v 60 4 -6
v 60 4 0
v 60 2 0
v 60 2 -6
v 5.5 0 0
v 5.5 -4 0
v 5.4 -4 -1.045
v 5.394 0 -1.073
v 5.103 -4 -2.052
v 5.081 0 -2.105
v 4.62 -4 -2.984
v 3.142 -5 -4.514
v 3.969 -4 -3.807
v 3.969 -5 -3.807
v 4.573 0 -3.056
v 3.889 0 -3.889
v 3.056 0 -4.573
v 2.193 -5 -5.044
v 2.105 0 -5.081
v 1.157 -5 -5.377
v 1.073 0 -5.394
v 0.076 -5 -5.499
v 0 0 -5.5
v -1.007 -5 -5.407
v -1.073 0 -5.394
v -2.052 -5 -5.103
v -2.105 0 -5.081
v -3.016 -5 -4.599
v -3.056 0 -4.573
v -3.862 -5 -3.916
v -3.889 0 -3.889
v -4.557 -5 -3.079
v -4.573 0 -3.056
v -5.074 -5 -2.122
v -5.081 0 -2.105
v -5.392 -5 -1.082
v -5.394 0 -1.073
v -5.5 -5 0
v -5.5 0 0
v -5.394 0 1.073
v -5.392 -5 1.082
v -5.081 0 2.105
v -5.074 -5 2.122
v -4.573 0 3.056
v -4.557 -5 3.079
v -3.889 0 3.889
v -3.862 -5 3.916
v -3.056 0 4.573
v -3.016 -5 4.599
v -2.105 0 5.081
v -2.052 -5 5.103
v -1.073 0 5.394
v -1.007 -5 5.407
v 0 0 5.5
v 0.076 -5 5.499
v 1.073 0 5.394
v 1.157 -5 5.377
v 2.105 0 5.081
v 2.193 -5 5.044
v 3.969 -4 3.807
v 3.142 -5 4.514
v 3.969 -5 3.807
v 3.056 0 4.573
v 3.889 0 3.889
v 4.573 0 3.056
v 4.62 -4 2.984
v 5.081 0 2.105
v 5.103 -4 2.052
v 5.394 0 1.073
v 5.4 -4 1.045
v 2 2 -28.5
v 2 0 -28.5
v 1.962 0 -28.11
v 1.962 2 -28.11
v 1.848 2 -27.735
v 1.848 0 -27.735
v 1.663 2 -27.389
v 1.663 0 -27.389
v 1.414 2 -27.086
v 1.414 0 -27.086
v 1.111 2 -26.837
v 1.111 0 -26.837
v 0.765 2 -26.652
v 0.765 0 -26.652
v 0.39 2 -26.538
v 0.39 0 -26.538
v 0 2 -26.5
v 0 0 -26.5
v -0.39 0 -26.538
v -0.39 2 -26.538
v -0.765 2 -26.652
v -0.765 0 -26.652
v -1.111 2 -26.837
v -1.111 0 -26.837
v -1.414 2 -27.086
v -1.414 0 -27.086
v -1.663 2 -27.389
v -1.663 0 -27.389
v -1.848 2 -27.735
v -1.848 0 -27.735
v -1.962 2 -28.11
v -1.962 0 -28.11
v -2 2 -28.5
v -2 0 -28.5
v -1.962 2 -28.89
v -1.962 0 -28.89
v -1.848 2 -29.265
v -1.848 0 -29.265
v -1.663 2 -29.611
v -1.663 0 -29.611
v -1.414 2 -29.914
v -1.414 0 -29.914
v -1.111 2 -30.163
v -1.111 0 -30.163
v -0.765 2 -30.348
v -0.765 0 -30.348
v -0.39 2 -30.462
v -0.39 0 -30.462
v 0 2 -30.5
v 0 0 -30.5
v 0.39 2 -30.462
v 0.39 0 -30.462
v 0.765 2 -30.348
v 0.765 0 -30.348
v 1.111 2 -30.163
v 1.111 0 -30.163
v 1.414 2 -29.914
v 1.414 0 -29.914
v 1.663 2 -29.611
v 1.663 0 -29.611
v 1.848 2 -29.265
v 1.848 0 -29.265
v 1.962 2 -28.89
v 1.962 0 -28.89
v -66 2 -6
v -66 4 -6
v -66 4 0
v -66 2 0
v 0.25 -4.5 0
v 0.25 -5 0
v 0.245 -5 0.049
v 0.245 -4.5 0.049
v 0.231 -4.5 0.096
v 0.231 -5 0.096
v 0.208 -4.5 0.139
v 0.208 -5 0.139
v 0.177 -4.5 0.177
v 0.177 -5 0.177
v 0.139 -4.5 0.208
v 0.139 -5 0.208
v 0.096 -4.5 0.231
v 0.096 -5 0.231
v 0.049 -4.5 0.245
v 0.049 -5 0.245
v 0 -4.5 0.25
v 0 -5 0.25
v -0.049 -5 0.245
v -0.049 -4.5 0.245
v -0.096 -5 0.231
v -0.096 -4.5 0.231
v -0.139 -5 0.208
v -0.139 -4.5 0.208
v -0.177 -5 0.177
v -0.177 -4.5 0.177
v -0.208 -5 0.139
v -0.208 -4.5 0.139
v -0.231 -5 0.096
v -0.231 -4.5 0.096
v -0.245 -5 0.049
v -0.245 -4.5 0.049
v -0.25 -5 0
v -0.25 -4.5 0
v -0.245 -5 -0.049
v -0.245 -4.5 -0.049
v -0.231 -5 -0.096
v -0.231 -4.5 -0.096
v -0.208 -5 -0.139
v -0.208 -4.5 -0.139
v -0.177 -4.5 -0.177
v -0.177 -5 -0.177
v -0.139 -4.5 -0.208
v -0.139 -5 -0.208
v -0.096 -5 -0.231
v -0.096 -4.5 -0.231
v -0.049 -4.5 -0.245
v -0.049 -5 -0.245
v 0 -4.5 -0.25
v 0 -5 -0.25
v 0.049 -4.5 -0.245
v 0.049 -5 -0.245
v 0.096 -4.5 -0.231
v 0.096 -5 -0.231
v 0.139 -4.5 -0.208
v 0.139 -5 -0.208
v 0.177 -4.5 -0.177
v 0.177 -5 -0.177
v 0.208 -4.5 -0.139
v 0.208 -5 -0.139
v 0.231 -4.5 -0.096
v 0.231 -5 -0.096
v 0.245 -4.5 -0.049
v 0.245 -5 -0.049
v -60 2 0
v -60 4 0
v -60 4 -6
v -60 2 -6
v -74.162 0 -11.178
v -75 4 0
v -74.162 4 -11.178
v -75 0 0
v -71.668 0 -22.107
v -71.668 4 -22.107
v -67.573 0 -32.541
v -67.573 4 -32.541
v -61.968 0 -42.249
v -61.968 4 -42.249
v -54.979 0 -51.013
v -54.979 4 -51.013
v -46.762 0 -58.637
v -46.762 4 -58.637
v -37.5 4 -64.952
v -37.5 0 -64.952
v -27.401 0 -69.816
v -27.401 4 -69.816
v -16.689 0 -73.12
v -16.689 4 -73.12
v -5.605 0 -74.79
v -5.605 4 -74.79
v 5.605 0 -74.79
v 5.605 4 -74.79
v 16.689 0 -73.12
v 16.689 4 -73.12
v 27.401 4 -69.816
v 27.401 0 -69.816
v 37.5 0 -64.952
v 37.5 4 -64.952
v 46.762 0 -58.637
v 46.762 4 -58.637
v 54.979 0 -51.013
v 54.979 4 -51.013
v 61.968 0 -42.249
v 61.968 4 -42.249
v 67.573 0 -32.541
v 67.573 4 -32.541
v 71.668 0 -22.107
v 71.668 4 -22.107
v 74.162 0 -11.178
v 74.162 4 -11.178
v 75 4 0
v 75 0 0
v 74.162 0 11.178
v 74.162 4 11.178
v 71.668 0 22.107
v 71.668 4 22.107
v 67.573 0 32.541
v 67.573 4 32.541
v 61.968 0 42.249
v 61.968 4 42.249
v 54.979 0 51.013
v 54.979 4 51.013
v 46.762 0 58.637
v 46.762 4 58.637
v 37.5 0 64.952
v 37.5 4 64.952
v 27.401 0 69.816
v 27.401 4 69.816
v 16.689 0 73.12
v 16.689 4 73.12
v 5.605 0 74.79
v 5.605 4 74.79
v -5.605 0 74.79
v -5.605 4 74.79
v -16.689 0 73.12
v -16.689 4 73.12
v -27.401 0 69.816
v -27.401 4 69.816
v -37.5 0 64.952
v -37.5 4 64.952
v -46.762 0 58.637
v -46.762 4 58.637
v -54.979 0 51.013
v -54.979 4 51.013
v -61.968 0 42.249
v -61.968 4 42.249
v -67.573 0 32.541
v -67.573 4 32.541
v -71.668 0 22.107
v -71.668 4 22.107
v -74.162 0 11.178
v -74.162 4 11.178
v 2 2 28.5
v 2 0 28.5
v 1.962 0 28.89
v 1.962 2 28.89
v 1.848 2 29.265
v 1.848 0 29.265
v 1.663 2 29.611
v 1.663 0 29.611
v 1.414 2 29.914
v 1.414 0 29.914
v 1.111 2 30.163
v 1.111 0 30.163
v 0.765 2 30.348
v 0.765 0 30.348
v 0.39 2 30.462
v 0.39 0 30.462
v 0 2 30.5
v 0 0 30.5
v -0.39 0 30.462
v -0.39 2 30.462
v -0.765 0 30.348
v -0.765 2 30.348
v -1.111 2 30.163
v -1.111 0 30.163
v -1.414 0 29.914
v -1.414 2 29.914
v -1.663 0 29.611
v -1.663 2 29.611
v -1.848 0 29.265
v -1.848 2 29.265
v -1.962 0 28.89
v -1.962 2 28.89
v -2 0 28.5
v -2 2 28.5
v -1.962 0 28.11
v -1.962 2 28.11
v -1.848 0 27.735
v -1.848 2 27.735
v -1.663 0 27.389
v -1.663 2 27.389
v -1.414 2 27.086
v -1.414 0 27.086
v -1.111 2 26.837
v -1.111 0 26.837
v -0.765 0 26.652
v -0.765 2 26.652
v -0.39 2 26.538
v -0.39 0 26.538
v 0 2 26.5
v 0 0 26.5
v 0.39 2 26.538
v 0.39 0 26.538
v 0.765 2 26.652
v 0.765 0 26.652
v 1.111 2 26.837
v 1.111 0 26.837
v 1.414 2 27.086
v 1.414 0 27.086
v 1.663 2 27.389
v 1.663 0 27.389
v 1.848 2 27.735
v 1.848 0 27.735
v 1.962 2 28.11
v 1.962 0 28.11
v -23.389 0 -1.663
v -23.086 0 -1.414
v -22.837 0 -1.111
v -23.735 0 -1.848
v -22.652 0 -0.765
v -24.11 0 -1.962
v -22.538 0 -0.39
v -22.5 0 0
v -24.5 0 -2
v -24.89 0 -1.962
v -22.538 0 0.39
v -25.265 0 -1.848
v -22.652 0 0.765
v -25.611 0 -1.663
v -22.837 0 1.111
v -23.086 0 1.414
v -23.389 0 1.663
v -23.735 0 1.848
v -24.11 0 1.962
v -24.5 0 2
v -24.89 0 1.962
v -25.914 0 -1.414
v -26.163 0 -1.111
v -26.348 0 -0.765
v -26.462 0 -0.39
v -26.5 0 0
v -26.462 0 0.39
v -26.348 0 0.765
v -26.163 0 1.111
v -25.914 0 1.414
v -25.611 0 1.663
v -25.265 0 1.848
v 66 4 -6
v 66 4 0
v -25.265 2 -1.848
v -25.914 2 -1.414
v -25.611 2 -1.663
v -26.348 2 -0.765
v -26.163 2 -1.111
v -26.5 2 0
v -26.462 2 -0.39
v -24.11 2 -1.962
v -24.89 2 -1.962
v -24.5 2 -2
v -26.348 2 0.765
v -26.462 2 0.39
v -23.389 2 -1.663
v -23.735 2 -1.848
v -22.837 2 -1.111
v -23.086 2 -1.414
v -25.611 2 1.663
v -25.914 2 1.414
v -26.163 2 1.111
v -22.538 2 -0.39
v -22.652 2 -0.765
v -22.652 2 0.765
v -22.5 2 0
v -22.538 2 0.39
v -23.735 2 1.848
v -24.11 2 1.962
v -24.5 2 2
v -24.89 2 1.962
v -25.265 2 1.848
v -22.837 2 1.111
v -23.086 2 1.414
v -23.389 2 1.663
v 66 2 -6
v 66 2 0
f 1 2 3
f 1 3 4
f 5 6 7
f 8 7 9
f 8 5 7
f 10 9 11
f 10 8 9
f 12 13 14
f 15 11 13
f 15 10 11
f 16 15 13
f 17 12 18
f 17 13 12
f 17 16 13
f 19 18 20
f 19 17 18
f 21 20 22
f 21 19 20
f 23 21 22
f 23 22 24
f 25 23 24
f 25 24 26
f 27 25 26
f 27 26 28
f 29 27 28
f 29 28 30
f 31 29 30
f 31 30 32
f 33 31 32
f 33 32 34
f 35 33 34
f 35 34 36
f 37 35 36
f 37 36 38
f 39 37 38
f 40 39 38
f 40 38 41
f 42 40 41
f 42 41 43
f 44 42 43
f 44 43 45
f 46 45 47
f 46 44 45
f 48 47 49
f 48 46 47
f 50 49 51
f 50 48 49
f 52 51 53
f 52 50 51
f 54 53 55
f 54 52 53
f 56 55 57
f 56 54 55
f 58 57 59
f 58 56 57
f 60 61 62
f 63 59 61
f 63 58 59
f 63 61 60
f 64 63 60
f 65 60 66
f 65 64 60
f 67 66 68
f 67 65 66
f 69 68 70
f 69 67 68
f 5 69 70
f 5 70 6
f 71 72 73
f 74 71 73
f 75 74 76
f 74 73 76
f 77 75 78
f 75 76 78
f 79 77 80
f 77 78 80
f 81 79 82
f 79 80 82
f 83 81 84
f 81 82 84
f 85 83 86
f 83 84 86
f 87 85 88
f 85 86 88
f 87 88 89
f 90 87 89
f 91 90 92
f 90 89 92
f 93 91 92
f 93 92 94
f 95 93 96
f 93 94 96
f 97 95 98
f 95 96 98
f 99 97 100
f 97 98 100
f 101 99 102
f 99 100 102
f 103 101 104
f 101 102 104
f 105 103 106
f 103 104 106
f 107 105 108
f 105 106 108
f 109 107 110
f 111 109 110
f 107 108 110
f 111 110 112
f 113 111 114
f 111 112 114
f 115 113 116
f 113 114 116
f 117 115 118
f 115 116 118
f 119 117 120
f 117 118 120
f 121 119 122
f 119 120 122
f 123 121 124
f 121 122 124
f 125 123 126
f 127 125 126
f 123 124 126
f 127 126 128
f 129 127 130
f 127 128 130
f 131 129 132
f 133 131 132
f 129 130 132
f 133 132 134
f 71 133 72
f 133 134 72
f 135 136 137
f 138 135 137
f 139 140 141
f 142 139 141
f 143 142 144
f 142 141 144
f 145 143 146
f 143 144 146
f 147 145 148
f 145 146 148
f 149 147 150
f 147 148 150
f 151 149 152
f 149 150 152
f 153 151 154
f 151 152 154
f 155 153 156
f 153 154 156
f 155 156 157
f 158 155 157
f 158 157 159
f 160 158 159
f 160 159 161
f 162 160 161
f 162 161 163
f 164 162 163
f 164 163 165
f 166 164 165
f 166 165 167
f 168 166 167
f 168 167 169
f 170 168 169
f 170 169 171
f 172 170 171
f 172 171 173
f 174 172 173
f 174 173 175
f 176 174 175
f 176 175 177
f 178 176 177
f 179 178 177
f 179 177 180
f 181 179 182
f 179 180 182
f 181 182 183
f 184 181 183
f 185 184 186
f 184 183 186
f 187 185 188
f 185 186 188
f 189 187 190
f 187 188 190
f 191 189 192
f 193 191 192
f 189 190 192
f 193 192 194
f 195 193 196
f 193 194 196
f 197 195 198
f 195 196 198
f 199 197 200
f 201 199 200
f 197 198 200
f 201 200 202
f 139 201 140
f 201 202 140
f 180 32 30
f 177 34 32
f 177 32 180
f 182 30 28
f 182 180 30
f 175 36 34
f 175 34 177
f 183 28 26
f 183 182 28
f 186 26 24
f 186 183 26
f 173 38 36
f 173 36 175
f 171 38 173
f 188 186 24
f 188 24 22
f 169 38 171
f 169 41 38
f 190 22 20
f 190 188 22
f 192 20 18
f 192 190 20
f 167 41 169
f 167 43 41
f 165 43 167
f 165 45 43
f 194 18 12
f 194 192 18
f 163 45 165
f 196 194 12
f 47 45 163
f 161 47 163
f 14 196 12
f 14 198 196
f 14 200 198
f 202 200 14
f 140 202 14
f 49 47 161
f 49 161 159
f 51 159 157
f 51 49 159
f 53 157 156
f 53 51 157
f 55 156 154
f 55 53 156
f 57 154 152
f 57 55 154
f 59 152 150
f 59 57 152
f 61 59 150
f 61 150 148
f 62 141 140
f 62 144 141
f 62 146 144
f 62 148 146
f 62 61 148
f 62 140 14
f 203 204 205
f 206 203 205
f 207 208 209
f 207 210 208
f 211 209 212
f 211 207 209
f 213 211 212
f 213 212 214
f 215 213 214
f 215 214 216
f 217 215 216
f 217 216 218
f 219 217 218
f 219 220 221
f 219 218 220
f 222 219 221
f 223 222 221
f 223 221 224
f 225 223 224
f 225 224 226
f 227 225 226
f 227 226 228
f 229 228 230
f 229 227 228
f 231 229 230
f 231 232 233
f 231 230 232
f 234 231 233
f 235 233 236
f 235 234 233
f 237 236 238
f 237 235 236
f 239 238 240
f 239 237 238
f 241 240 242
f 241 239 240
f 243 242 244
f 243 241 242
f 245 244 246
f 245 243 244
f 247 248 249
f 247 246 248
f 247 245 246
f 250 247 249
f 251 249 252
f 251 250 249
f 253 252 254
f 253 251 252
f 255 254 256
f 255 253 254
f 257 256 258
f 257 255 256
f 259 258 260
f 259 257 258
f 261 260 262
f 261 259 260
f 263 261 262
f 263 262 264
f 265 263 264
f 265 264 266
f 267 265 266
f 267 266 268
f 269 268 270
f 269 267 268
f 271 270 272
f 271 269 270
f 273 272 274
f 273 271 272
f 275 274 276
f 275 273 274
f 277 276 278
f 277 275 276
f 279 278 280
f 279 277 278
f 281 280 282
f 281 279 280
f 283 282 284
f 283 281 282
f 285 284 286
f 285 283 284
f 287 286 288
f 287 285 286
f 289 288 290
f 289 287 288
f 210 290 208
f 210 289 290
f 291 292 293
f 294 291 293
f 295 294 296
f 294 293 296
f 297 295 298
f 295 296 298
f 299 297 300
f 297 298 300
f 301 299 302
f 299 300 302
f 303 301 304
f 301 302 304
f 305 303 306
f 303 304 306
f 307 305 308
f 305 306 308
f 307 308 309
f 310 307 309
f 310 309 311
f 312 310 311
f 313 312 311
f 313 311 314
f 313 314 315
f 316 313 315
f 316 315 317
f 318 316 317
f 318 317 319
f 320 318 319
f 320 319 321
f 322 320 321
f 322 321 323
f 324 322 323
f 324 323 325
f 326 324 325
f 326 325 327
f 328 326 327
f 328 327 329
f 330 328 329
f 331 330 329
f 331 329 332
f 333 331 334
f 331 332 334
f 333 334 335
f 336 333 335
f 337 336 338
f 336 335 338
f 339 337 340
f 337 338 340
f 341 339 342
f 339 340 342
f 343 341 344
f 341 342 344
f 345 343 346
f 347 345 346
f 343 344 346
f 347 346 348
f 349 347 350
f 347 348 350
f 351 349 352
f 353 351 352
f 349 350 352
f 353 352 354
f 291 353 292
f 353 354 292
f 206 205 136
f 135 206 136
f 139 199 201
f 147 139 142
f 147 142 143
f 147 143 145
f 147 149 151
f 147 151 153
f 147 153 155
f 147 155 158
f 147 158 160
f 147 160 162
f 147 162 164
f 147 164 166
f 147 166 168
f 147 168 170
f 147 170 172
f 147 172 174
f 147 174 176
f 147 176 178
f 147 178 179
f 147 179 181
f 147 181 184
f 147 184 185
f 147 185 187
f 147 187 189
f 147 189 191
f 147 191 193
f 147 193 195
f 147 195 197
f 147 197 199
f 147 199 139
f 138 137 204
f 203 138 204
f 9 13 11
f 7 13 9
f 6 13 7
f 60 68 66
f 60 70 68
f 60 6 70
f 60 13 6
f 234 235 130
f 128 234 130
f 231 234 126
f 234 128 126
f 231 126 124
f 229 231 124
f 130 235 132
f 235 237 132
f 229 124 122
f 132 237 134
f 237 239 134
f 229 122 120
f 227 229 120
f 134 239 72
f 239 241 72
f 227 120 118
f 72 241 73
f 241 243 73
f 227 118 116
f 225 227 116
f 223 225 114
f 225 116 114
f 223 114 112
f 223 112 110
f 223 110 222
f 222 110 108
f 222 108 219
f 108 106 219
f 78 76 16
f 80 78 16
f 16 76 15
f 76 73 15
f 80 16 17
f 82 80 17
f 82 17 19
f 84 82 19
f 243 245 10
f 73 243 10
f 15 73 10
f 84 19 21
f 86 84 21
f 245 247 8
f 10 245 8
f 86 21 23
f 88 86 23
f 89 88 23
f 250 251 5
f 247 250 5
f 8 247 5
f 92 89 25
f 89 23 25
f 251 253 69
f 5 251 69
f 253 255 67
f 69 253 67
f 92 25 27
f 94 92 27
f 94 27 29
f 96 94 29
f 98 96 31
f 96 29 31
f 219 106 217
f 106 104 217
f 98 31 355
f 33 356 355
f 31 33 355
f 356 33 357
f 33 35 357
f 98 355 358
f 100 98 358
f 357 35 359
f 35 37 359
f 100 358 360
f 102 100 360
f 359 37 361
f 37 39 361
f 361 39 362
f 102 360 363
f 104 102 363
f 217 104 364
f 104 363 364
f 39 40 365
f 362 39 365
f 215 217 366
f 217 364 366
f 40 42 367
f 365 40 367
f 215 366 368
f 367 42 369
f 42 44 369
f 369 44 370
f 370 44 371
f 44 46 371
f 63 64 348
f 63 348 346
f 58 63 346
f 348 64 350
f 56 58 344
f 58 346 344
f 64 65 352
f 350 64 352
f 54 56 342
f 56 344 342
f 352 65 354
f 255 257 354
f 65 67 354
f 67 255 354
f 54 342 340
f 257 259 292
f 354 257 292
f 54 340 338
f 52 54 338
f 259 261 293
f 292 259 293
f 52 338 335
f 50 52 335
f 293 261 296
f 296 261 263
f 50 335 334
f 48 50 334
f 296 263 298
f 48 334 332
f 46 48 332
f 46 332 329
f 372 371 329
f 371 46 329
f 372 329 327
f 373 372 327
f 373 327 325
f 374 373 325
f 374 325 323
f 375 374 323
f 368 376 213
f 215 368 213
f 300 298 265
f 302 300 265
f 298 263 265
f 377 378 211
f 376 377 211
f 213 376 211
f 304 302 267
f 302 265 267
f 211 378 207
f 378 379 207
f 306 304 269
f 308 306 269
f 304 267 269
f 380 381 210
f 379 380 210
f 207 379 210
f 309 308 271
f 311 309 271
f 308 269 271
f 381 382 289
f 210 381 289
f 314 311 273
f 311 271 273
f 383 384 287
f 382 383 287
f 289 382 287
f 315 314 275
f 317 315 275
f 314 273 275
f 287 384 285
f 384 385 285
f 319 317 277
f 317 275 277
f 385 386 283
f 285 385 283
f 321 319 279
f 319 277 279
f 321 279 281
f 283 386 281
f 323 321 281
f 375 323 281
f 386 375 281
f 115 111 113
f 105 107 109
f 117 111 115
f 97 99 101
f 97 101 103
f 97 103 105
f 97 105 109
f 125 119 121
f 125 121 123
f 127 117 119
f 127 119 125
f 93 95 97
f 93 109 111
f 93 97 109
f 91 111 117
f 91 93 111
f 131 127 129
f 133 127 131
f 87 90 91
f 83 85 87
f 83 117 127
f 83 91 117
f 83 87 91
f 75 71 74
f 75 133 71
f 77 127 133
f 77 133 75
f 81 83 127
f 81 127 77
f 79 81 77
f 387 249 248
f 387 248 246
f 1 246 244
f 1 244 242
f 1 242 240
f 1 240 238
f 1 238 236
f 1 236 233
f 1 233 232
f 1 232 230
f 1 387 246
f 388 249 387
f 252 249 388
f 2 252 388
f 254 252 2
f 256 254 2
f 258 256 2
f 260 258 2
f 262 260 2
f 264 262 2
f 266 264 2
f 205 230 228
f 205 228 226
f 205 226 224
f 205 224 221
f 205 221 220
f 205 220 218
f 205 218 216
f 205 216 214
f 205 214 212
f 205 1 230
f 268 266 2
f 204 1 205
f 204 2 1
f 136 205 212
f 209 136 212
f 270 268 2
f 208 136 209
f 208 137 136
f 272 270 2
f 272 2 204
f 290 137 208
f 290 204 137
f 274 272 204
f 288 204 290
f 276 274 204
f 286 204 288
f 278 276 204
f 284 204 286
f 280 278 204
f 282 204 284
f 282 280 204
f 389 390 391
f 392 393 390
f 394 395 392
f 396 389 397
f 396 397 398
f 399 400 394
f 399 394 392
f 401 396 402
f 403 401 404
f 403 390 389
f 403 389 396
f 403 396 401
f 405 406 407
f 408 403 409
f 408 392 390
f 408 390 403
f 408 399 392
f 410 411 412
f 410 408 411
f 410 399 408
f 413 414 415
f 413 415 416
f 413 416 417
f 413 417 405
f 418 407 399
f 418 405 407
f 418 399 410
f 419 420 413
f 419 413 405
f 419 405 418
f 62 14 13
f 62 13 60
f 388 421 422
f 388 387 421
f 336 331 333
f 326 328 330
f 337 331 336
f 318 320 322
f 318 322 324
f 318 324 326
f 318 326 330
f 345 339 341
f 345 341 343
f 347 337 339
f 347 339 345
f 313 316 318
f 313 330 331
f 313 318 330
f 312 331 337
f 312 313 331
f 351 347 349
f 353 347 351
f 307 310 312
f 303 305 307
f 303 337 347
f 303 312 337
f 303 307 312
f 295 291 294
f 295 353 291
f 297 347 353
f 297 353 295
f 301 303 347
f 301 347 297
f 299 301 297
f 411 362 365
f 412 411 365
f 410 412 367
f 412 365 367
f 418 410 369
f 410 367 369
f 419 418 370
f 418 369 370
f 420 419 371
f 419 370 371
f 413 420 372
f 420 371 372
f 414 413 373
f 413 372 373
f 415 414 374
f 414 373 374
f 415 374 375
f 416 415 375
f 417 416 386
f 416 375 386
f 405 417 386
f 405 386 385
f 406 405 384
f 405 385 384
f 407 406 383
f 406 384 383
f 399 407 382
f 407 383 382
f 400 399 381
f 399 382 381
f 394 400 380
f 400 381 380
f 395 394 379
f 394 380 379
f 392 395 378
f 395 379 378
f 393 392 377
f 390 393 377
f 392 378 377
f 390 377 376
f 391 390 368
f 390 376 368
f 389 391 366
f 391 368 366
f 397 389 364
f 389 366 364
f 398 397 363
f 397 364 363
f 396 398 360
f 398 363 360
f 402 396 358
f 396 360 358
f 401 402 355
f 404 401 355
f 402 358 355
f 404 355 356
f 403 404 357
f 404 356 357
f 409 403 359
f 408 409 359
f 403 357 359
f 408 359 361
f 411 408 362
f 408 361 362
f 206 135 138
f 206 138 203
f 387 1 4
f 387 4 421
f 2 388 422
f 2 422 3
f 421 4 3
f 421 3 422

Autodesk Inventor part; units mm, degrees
ref_plane "YZ Plane" through (0, 0, 0) normal (1, 0, 0) x (0, 1, 0)
ref_plane "XZ Plane" through (0, 0, 0) normal (0, 1, 0) x (-1, 0, 0)
ref_plane "XY Plane" through (0, 0, 0) normal (0, 0, 1) x (1, 0, 0)
sketch "Sketch1" plane through (0, 0, 0) normal (0, 1, 0) x (-1, 0, 0)
  circle A0 centre (0, 0) radius 75
  dimension "d0" = 150
extrude "Extrusion1" add sketch "Sketch1" along normal blind 4
sketch "Sketch2" plane through (0, 0, 0) normal (0, -1, 0) x (1, 0, 0)
  point P0 (0, 0)
sketch "Sketch4" plane through (0, 0, 0) normal (0, -1, 0) x (1, 0, 0)
  circle A0 centre (0, 0) radius 5.5
  dimension "d7" = 11
extrude "Extrusion3" add sketch "Sketch4" along normal blind 5
sketch "Sketch5" plane through (0, 0, 0) normal (0, -1, 0) x (1, 0, 0)
  point P0 (0, 0)
sketch "Sketch8" plane through (0, -5, 0) normal (0, -1, 0) x (1, 0, 0)
  line L0 (3.9692, 4.8706) -> (31.1403, 4.8706)
  line L1 (31.1403, 4.8706) -> (31.1403, -5.1294)
  line L2 (31.1403, -5.1294) -> (3.9692, -5.1294)
  line L3 (3.9692, -5.1294) -> (3.9692, 4.8706)
  point P0 (0, 0)
  dimension "d15" = 10
extrude "Extrusion5" cut sketch "Sketch8" against normal blind 1
sketch "Sketch9" plane through (0, 0, 0) normal (0, -1, 0) x (1, 0, 0)
  circle A0 centre (-24.5, 0) radius 1.5 construction
  circle A1 centre (0, 28.5) radius 1.5 construction
  circle A2 centre (0, -28.5) radius 1.5 construction
  circle A3 centre (0, -28.5) radius 2
  circle A4 centre (-24.5, 0) radius 2
  circle A5 centre (0, 28.5) radius 2
  point P0 (0, 0)
  dimension "d28" = 4
  dimension "d29" = 4
  dimension "d30" = 4
extrude "Extrusion6" cut sketch "Sketch9" against normal blind 2
sketch "Sketch10" plane through (0, 4, 0) normal (0, 1, 0) x (1, 0, 0)
  line L0 (0, 0) -> (-8.5469, 0)
  line L1 (-66, 0) -> (-60, 0)
  line L2 (-60, 0) -> (-60, 6)
  line L3 (-60, 6) -> (-66, 6)
  line L4 (-66, 6) -> (-66, 0)
  line L5 (60, 6) -> (66, 6)
  line L6 (66, 6) -> (66, 0)
  line L7 (66, 0) -> (60, 0)
  line L8 (60, 0) -> (60, 6)
  line L9 (-60, 3) -> (0, 3)
  line L10 (0, 0) -> (0, 26.4138)
  line L11 (60, 3) -> (0, 3)
  line L12 (0, 0) -> (22.9317, 0)
  dimension "d22" = 6
  dimension "d23" = 6
  dimension "d24" = 60
extrude "Extrusion7" cut sketch "Sketch10" against normal blind 2
sketch "Sketch11" plane through (0, -5, 0) normal (0, -1, 0) x (1, 0, 0)
  arc A0 (3.9692, 3.8073) -> (3.9692, -3.8073) centre (0, 0) ccw projected
  circle A1 centre (0, 0) radius 0.25
  dimension "d31" = 0.5
extrude "Extrusion8" cut sketch "Sketch11" against normal blind 0.5
equation "\"d0\" = diamteru"
equation "\"d1\" = grosime"
equation "\"diamteru\" = 150"
equation "\"grosime\" = 4"
properties part number "pat" material "PET Plastic"
